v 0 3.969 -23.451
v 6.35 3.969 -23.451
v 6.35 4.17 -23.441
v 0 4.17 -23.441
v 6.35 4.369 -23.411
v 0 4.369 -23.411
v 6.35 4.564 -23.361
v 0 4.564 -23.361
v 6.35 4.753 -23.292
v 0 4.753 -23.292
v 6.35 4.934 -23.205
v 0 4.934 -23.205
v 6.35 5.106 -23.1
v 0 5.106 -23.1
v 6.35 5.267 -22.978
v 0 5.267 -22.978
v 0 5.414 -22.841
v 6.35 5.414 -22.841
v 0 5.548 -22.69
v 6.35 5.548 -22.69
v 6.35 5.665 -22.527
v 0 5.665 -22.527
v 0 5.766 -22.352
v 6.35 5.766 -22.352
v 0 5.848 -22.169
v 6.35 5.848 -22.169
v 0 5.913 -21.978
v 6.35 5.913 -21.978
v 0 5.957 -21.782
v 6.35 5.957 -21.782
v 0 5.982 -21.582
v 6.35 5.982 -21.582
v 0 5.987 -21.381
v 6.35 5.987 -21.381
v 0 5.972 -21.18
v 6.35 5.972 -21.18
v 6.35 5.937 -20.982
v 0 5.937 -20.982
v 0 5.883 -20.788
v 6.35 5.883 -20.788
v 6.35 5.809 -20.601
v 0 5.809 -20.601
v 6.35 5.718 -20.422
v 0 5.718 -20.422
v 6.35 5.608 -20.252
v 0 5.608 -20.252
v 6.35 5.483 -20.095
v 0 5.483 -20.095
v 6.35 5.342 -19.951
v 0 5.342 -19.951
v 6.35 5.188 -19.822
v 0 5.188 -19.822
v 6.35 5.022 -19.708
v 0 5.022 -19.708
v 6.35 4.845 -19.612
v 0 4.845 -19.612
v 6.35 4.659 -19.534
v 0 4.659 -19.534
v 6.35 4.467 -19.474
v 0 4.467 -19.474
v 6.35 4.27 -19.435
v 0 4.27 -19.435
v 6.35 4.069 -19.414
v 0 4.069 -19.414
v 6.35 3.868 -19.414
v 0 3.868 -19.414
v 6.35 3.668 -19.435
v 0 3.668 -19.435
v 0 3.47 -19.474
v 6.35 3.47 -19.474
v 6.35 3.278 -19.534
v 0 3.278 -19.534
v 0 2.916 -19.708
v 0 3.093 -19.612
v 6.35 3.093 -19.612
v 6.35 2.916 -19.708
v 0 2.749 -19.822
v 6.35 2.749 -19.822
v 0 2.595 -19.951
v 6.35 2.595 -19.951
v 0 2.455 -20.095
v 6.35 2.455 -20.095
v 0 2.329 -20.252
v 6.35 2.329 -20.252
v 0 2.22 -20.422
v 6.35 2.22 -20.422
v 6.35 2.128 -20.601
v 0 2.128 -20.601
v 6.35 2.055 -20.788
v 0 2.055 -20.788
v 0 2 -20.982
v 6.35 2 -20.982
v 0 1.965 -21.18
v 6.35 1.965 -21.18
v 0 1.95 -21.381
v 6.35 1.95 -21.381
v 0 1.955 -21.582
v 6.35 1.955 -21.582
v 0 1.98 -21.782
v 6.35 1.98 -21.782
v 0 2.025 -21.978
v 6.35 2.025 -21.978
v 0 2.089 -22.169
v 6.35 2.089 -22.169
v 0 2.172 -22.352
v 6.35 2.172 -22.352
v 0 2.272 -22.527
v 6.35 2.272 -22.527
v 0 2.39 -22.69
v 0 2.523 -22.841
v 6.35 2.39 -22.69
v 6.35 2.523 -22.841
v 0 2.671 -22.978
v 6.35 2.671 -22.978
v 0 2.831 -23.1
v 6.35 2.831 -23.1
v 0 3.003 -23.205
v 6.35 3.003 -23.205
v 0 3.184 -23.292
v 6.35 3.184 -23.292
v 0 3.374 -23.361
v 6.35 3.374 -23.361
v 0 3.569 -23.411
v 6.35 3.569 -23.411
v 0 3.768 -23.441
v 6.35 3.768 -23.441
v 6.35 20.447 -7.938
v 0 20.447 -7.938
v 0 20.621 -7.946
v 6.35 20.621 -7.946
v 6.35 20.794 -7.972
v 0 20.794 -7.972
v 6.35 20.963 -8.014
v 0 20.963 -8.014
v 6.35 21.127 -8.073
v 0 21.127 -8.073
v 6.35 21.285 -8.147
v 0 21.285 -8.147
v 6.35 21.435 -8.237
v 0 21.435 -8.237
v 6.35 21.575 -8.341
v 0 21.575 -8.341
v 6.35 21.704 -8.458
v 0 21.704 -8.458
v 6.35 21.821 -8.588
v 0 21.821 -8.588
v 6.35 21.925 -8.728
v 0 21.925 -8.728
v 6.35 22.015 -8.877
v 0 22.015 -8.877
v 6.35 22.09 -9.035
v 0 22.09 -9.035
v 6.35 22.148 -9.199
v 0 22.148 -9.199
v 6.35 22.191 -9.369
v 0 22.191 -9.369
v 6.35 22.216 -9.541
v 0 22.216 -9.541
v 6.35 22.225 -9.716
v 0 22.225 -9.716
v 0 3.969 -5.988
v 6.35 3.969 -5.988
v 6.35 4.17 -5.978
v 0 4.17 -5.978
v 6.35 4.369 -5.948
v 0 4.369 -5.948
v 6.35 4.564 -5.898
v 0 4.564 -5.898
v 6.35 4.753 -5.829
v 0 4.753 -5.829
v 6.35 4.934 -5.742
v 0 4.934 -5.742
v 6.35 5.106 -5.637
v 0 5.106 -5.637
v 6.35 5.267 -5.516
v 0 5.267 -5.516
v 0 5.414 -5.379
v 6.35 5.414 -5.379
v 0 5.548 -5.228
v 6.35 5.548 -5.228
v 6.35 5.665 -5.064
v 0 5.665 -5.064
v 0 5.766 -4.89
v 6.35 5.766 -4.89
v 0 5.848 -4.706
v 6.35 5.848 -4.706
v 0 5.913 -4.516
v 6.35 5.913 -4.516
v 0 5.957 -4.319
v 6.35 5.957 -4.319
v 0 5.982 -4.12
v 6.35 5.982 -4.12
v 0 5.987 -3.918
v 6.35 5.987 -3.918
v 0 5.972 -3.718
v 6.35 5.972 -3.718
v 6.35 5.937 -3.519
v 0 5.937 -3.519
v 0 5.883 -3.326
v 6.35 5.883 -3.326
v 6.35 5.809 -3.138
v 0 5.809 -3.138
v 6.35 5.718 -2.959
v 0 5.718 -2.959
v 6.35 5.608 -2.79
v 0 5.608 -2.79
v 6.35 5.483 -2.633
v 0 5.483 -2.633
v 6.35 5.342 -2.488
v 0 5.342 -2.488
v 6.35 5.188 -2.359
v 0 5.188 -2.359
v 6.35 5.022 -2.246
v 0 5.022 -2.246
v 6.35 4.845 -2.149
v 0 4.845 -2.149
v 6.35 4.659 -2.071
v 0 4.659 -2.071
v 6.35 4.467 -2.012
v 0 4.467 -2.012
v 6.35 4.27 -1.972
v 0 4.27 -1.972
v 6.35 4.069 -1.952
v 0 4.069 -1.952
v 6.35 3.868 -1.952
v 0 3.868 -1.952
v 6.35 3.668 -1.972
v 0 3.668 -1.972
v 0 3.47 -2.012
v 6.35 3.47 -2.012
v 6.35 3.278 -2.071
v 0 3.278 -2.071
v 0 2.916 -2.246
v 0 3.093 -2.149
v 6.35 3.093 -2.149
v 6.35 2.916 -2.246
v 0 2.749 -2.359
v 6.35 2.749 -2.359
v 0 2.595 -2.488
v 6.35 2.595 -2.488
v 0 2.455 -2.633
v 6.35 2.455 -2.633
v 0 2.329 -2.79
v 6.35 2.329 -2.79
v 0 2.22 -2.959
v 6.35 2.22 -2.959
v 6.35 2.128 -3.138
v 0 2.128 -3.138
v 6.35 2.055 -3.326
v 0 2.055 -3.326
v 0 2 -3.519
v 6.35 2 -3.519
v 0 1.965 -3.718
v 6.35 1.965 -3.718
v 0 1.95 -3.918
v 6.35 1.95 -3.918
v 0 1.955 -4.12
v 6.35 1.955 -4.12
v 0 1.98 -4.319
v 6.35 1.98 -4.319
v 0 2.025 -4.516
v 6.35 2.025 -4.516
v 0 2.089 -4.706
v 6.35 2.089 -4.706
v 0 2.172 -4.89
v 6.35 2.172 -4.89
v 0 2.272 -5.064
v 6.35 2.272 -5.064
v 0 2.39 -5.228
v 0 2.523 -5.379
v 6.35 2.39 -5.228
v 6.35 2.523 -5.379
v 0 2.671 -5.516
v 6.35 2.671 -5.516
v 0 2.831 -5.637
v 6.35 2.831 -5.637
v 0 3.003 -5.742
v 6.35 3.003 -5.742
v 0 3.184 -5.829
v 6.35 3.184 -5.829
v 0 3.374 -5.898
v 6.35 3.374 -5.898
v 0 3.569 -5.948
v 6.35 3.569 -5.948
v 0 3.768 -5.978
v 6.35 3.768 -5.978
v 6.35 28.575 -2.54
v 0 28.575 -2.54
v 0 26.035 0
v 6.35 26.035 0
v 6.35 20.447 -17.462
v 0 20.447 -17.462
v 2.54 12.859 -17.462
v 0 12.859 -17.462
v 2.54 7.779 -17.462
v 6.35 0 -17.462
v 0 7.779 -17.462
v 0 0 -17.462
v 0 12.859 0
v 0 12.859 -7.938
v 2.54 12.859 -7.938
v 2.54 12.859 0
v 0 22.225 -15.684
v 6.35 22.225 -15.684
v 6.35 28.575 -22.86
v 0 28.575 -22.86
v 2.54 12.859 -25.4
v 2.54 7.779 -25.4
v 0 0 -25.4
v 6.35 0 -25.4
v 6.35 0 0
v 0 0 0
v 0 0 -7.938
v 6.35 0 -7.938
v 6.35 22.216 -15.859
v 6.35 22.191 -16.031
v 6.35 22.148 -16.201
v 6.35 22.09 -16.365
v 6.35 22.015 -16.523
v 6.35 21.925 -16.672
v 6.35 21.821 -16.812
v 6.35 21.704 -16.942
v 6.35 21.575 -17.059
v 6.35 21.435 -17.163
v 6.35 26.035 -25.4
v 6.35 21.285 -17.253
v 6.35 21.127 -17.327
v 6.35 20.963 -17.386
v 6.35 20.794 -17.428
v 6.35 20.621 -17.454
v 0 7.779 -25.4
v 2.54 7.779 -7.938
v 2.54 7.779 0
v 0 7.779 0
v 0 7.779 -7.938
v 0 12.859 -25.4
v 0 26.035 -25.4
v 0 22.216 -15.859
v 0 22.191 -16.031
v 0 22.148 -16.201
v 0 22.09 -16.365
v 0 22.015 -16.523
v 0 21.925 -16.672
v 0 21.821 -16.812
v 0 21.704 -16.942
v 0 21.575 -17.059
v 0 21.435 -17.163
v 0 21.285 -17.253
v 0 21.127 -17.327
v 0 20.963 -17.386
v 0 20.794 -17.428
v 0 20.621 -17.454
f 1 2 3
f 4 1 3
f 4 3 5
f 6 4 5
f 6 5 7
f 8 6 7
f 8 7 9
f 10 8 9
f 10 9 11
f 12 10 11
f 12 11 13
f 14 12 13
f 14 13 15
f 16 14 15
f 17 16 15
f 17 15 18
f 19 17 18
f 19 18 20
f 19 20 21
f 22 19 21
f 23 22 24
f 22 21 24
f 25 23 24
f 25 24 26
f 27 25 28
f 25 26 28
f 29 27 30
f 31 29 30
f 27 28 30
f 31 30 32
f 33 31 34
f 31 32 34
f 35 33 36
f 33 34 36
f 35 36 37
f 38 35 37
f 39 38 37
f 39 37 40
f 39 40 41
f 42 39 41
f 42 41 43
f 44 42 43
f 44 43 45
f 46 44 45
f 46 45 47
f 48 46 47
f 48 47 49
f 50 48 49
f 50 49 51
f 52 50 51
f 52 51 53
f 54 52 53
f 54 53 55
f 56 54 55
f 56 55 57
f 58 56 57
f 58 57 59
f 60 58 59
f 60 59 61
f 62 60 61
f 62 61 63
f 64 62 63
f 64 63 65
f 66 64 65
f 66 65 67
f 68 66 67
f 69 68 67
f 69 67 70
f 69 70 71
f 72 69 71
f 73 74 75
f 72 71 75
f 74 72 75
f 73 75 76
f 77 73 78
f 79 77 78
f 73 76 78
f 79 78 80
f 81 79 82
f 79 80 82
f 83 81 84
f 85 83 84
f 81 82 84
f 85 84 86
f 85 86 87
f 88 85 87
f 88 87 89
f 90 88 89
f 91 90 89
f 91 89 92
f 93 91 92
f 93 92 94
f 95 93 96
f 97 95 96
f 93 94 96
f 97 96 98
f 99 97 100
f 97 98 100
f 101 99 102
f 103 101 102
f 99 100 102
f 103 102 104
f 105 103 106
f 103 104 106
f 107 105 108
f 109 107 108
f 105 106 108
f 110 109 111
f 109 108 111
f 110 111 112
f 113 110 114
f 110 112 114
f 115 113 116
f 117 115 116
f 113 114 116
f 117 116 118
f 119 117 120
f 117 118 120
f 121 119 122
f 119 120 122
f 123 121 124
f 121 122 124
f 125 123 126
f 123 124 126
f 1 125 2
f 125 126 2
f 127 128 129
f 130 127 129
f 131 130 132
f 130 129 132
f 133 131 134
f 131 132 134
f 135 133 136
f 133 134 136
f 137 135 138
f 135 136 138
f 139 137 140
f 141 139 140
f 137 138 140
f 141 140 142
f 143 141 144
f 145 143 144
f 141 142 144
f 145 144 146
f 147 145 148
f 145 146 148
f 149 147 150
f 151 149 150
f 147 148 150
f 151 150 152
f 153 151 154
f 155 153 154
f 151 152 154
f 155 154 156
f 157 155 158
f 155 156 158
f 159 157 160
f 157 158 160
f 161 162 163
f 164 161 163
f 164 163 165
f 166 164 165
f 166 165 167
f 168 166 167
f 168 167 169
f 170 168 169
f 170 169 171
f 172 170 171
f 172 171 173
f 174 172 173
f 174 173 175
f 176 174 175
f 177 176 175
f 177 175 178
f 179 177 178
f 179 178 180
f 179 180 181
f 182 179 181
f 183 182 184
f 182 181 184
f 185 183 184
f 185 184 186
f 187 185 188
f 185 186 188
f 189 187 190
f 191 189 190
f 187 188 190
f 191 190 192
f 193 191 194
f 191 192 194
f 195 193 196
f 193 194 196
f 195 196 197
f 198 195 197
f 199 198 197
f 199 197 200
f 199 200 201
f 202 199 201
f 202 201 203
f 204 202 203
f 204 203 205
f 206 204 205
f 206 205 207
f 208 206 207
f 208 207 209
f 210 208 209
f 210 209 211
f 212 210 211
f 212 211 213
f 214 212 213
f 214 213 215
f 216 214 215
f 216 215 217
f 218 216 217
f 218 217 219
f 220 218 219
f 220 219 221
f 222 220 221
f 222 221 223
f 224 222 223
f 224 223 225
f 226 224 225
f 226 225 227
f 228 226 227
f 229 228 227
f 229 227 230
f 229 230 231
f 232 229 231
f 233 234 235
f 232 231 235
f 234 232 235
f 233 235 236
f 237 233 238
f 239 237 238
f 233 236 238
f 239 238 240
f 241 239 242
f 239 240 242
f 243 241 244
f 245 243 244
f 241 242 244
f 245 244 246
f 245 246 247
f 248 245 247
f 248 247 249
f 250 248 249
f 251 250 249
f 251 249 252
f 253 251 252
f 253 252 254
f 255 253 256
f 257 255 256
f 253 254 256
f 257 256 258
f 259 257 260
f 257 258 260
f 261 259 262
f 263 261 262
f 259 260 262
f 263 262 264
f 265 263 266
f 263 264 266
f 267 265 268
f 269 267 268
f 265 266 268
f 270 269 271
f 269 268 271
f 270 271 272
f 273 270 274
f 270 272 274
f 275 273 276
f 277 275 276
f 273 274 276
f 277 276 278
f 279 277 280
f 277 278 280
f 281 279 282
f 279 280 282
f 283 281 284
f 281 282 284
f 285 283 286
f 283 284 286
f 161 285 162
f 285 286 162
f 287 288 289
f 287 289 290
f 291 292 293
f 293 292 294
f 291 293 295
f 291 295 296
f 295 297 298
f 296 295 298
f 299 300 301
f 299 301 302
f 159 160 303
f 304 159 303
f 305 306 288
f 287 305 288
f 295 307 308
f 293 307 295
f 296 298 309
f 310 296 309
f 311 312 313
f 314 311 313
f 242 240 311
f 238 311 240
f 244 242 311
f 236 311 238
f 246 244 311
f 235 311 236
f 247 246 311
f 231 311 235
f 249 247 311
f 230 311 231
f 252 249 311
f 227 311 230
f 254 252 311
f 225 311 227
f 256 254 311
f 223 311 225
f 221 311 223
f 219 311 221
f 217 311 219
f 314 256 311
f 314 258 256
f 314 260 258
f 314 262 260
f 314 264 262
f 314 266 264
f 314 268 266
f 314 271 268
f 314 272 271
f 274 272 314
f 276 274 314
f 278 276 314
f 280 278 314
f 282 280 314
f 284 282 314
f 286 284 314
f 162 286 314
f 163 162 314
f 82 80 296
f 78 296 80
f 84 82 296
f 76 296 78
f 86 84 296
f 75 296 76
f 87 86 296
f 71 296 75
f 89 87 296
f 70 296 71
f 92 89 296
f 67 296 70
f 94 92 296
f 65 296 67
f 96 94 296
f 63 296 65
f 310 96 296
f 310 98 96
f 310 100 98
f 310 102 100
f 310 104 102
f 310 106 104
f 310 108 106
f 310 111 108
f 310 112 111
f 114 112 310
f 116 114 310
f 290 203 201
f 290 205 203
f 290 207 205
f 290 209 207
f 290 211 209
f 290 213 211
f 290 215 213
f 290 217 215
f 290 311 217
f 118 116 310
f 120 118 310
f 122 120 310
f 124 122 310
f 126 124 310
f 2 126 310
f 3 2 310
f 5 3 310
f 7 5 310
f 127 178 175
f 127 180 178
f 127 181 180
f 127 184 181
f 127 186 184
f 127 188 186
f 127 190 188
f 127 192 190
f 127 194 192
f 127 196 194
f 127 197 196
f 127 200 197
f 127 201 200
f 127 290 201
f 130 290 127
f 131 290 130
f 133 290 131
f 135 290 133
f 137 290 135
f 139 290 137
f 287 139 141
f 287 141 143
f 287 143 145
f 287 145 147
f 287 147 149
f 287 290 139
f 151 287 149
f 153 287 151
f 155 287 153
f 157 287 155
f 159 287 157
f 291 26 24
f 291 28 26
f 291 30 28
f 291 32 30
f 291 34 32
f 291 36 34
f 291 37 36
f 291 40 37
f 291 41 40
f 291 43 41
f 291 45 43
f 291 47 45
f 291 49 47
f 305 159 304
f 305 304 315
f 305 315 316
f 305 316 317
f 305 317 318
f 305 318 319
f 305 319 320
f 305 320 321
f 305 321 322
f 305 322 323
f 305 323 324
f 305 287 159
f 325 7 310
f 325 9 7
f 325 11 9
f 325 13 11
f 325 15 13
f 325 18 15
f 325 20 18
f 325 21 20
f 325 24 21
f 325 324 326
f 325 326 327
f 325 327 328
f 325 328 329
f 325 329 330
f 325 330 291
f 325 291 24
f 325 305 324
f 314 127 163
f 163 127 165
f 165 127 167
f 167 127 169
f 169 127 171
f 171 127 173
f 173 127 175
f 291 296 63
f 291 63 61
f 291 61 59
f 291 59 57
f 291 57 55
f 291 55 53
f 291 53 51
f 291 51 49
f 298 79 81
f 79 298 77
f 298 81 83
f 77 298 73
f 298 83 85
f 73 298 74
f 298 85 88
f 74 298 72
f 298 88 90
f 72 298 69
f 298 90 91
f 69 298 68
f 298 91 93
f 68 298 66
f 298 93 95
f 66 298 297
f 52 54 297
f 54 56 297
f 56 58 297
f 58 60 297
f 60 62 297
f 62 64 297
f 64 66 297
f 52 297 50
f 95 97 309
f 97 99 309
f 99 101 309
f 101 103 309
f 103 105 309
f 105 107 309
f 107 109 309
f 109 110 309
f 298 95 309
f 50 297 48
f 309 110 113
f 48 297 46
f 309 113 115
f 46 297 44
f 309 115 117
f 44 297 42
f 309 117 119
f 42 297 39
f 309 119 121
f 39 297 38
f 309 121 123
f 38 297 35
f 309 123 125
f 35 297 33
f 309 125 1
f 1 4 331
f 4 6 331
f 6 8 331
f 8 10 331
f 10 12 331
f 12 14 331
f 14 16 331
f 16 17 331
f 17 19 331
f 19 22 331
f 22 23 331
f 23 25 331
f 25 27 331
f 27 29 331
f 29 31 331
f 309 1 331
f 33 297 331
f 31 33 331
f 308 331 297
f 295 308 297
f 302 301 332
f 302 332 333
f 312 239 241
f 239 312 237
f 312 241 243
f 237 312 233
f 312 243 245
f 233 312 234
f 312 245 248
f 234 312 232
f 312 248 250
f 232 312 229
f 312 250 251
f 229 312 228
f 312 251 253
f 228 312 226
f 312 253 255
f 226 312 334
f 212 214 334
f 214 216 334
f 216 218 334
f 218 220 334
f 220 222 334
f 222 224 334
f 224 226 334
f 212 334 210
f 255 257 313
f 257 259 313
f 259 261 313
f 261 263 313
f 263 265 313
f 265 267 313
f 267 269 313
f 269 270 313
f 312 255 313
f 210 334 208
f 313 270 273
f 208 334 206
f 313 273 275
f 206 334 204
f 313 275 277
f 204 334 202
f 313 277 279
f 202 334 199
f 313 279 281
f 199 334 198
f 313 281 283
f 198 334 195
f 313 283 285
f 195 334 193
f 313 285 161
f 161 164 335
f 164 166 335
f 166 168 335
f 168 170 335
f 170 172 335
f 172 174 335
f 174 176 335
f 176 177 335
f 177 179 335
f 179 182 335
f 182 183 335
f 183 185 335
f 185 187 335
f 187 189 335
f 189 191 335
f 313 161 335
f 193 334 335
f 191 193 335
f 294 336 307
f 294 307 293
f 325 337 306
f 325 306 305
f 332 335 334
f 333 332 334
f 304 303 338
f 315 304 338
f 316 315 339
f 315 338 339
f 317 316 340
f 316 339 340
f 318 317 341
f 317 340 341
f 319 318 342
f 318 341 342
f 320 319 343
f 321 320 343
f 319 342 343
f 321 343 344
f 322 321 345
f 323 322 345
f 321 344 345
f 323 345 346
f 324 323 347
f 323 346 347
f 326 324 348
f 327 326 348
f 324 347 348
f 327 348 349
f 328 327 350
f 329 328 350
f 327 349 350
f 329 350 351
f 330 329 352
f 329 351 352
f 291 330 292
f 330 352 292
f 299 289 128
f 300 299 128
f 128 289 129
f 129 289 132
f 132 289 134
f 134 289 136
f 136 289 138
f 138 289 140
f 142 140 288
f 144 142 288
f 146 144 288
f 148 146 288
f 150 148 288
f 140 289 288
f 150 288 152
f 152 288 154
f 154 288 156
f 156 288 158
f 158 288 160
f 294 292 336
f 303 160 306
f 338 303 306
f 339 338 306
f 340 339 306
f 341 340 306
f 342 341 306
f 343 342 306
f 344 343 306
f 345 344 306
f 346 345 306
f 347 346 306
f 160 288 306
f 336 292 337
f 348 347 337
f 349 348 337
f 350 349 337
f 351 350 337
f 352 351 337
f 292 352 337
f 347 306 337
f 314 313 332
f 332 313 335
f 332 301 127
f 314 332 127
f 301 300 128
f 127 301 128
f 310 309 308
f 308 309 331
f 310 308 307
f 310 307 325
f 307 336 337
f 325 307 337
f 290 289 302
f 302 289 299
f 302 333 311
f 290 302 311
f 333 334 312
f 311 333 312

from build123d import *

# Parameters (mm, degrees)
BOSS_EXTRUDE1_DEPTH    = 6.35
F_10_32_TAPPED_HOLE1_D = 4.0386
SKETCH2_W              = 25.4
SKETCH2_H              = 5.08
CUT_EXTRUDE1_DEPTH     = 2.54
CHAMFER1_SIZE          = 2.54


with BuildPart() as part:
    # Sketch1 → Boss-Extrude1 (new body)
    with BuildSketch(Plane(origin=(0, 0, 0), x_dir=(0, 0, -1), z_dir=(1, 0, 0))):
        with BuildLine():
            Line((7.9375, 0), (7.9375, 20.447))
            ThreePointArc((7.9375, 20.447), (8.458264143, 21.704235857), (9.7155, 22.225))
            Line((9.7155, 22.225), (15.6845, 22.225))
            ThreePointArc((15.6845, 22.225), (16.941735857, 21.704235857), (17.4625, 20.447))
            Line((17.4625, 20.447), (17.4625, 0))
            Line((17.4625, 0), (25.4, 0))
            Line((25.4, 0), (25.4, 28.575))
            Line((25.4, 28.575), (0, 28.575))
            Line((0, 28.575), (0, 0))
            Line((0, 0), (7.9375, 0))
        make_face()
    extrude(amount=BOSS_EXTRUDE1_DEPTH)

    # #10-32 Tapped Hole1 (through all)
    with Locations(Plane.ZY):
        with Locations((-21.43125, 3.96875), (-3.96875, 3.96875)):
            Hole(F_10_32_TAPPED_HOLE1_D / 2)

    # Sketch2 → Cut-Extrude1 (cut)
    with BuildSketch(Plane.ZY):
        with Locations((-12.7, 10.31875)):
            Rectangle(SKETCH2_W, SKETCH2_H)
    extrude(amount=-CUT_EXTRUDE1_DEPTH, mode=Mode.SUBTRACT)

    # Chamfer1
    chamfer1_edges = [part.edges().sort_by_distance(p)[0] for p in [
        (3.175, 28.575, 0),
        (3.175, 28.575, -25.4),
    ]]
    chamfer(chamfer1_edges, length=CHAMFER1_SIZE)


solid = part.part
